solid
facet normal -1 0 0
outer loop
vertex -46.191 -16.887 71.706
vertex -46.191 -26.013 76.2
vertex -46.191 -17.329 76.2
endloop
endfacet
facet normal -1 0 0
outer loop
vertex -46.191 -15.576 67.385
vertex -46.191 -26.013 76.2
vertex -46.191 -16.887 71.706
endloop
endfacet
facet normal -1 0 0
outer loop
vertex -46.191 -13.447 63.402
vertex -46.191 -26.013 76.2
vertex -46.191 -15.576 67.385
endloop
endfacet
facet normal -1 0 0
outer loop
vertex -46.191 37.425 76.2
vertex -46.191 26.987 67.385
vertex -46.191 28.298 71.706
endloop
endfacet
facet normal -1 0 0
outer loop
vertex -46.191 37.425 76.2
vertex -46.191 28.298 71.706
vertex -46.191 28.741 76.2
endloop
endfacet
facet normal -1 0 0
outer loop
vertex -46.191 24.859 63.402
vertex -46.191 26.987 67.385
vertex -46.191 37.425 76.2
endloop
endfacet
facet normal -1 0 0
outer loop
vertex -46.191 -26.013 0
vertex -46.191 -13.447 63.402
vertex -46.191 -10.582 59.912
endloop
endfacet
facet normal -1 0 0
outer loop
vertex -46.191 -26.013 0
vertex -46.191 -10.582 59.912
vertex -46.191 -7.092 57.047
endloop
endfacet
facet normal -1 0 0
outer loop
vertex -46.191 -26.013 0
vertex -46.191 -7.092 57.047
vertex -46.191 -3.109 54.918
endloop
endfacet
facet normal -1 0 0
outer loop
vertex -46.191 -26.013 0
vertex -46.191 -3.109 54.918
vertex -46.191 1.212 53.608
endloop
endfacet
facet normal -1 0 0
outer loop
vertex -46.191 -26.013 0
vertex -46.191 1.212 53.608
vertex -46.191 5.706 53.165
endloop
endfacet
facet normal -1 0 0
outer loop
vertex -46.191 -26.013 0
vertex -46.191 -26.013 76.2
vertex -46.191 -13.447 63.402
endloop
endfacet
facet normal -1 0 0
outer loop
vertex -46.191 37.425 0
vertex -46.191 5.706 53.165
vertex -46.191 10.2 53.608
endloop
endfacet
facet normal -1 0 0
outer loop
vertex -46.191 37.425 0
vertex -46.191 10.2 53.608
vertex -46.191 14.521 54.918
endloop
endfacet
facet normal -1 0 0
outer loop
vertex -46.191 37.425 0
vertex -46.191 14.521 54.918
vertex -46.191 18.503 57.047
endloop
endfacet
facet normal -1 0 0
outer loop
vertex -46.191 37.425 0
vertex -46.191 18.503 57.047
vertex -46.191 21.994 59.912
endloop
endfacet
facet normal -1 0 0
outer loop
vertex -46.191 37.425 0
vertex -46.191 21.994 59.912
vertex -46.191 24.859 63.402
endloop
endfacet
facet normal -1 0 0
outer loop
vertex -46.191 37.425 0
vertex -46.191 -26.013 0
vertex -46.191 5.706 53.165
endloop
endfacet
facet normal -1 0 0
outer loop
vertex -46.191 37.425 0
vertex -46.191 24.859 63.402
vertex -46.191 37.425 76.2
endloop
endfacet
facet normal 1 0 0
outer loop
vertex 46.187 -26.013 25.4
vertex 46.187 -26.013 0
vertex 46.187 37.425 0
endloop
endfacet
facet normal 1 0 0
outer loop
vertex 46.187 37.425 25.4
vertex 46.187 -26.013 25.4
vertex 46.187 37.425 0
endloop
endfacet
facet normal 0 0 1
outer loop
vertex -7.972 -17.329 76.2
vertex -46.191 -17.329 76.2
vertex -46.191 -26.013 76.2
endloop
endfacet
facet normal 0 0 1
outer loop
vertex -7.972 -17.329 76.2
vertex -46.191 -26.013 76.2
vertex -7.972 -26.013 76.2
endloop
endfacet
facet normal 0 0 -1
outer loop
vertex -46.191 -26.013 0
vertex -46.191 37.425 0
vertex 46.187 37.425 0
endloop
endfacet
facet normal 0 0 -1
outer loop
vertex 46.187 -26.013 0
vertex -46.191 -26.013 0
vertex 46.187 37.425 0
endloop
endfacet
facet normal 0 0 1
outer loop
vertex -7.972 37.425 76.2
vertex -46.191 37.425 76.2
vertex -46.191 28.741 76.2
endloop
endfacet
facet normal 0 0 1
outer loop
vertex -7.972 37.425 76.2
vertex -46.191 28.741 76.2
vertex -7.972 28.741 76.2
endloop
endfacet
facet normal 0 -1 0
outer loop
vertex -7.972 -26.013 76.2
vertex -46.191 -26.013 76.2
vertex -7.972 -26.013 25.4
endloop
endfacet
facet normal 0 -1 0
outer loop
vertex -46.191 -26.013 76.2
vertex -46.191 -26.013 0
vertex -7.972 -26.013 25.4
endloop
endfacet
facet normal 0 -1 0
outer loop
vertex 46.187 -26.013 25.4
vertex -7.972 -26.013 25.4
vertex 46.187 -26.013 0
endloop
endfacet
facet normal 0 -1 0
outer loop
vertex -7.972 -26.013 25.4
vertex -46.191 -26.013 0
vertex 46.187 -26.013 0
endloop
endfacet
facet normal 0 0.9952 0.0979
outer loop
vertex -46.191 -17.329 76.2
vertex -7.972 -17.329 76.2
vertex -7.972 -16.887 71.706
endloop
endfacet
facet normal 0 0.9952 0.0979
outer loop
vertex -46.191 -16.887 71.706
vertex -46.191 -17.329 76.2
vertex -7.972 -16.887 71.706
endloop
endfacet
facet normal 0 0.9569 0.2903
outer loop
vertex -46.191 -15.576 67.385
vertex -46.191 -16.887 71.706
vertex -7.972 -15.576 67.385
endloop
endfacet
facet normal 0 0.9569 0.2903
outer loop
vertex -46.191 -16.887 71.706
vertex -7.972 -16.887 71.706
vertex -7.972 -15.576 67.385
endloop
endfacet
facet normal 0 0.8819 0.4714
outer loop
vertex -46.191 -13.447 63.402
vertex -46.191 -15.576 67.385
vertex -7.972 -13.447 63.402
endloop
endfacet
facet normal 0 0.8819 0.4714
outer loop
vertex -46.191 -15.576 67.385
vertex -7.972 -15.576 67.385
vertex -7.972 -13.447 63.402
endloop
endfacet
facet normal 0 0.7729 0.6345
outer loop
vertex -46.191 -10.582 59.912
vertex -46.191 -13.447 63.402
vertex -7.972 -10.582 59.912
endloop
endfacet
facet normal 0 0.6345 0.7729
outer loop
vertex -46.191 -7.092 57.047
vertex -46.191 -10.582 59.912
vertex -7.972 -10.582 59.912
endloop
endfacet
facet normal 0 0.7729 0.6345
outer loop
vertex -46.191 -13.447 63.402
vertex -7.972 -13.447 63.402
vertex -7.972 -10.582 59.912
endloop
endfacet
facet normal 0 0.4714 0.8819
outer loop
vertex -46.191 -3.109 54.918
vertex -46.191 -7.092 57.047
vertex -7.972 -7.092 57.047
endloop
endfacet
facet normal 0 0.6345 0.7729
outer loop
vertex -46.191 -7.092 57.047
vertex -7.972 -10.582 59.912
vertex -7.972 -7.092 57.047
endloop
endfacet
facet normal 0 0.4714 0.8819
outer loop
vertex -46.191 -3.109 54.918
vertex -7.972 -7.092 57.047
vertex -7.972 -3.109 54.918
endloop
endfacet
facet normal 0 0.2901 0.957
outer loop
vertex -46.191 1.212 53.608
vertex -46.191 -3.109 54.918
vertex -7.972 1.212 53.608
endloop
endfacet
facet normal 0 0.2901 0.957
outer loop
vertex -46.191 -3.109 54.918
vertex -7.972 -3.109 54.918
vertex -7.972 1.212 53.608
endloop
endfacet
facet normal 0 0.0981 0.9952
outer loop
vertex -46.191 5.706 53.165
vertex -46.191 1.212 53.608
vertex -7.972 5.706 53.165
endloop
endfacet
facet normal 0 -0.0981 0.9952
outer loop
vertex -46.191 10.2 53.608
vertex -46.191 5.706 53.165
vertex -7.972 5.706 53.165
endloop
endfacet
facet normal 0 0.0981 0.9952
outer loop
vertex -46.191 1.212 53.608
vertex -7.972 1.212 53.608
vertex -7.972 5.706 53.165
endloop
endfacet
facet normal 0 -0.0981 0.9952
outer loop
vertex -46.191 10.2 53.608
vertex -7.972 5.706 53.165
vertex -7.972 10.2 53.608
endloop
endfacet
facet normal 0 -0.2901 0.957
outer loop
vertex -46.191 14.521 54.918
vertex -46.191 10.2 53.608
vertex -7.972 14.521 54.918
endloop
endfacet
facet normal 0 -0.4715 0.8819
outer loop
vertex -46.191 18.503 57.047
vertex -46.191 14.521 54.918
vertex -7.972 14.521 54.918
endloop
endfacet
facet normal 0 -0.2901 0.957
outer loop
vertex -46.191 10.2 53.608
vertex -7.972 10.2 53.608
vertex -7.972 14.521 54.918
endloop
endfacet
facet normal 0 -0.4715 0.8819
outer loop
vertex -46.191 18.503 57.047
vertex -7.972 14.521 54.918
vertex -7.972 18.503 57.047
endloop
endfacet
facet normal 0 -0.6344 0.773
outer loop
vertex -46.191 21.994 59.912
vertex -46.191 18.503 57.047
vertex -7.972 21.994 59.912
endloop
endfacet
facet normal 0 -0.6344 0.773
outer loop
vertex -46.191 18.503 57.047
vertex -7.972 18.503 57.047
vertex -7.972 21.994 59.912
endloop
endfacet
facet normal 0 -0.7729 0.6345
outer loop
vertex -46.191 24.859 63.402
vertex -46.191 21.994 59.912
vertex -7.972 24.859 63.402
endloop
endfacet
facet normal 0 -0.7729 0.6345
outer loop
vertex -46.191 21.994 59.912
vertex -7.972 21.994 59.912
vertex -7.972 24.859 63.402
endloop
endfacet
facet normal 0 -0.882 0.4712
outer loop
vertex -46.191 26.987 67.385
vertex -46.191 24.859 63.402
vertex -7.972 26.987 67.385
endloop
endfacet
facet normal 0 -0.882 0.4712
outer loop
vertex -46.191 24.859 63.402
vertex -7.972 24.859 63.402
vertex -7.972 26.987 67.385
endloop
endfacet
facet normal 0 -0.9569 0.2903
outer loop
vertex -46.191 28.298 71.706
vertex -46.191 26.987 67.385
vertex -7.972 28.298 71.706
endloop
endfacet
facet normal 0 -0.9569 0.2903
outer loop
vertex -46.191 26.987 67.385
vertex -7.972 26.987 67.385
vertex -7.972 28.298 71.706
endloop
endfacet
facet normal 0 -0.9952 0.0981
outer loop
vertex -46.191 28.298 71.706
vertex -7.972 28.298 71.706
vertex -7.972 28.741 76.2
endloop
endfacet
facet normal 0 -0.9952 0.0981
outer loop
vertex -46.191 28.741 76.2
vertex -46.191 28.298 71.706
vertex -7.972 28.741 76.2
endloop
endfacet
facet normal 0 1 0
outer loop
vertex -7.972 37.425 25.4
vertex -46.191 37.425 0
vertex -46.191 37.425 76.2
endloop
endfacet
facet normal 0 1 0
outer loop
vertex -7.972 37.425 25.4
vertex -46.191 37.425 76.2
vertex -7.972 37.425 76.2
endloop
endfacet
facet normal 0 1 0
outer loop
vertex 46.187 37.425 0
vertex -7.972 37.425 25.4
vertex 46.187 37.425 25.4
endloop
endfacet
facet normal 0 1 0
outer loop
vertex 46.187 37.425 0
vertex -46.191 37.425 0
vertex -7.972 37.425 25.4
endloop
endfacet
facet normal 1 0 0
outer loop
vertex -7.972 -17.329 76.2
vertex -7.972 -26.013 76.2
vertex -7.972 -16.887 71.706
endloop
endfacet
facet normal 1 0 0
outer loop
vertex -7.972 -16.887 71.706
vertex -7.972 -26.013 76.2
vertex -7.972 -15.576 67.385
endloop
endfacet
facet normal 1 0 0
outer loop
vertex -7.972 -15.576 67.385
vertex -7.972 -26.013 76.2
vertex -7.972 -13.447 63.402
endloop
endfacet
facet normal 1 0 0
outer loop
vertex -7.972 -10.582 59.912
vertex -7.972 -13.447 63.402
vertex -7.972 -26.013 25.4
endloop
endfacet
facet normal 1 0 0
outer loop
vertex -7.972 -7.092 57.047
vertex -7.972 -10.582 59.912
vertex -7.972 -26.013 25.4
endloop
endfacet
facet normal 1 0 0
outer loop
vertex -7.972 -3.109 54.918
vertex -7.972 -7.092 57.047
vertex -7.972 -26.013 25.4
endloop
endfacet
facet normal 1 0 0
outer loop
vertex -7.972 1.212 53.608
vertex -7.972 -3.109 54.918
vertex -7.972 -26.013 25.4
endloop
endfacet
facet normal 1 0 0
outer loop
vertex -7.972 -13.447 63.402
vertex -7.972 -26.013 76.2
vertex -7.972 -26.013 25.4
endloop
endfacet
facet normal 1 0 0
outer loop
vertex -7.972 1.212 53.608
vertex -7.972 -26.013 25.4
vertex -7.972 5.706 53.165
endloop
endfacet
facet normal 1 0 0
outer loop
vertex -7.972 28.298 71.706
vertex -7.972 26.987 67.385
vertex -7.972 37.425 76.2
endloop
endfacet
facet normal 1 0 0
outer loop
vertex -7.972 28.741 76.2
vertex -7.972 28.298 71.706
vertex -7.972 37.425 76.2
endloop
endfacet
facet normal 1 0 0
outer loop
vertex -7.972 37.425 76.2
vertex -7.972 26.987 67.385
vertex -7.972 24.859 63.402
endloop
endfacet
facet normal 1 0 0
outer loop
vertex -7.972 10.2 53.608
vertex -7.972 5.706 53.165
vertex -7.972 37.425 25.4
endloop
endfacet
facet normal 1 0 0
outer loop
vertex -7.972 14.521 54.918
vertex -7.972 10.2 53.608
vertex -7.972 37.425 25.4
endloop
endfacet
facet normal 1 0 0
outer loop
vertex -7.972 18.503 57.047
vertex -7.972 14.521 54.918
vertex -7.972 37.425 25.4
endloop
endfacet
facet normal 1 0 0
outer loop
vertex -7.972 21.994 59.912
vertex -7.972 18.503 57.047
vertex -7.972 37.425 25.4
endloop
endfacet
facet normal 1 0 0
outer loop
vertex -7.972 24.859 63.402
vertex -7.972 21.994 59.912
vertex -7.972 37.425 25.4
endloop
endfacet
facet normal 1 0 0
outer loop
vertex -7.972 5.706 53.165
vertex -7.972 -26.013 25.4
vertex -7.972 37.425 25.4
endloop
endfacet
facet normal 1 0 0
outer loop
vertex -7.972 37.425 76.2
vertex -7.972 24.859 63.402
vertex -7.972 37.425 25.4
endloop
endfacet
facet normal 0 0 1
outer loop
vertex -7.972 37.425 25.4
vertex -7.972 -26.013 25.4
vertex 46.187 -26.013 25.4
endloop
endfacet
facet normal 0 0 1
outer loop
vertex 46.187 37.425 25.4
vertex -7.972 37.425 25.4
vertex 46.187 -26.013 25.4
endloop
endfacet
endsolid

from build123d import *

# Parameters (mm, degrees)
F0_W     = 92.3780202866
F0_H     = 63.4378064424
F1_DEPTH = 25.4
F2_W     = 38.2190011442
F2_H     = 63.4378064424
F3_DEPTH = 50.8
F7_DEPTH = 50.8


# Not quite as in the source:
# - the program builds the solid bodies; features that only make, move or delete a surface that nothing else refers to are left out


with BuildPart() as f1:
    # F0 (on Top) → F1 (new body)
    with BuildSketch(Plane.XY):
        with Locations((-0.0018253922, 5.7058585808)):
            Rectangle(F0_W, F0_H)
    extrude(amount=F1_DEPTH)

    # F2 (on face) → F3 (join)
    with BuildSketch(Plane.XY.offset(25.4)):
        with Locations((-27.0813349634, 5.7058585808)):
            Rectangle(F2_W, F2_H)
    extrude(amount=F3_DEPTH)

    # F6 (on face) → F7 (cut)
    with BuildSketch(Plane.YZ.offset(-7.9718343914)):
        with BuildLine():
            ThreePointArc((-17.3291587886, 76.2), (5.7058585808, 53.1649826306), (28.7408759501, 76.2))
            Line((28.7408759501, 76.2), (-17.3291587886, 76.2))
        make_face()
    extrude(amount=-F7_DEPTH, mode=Mode.SUBTRACT)


solid = f1.part
